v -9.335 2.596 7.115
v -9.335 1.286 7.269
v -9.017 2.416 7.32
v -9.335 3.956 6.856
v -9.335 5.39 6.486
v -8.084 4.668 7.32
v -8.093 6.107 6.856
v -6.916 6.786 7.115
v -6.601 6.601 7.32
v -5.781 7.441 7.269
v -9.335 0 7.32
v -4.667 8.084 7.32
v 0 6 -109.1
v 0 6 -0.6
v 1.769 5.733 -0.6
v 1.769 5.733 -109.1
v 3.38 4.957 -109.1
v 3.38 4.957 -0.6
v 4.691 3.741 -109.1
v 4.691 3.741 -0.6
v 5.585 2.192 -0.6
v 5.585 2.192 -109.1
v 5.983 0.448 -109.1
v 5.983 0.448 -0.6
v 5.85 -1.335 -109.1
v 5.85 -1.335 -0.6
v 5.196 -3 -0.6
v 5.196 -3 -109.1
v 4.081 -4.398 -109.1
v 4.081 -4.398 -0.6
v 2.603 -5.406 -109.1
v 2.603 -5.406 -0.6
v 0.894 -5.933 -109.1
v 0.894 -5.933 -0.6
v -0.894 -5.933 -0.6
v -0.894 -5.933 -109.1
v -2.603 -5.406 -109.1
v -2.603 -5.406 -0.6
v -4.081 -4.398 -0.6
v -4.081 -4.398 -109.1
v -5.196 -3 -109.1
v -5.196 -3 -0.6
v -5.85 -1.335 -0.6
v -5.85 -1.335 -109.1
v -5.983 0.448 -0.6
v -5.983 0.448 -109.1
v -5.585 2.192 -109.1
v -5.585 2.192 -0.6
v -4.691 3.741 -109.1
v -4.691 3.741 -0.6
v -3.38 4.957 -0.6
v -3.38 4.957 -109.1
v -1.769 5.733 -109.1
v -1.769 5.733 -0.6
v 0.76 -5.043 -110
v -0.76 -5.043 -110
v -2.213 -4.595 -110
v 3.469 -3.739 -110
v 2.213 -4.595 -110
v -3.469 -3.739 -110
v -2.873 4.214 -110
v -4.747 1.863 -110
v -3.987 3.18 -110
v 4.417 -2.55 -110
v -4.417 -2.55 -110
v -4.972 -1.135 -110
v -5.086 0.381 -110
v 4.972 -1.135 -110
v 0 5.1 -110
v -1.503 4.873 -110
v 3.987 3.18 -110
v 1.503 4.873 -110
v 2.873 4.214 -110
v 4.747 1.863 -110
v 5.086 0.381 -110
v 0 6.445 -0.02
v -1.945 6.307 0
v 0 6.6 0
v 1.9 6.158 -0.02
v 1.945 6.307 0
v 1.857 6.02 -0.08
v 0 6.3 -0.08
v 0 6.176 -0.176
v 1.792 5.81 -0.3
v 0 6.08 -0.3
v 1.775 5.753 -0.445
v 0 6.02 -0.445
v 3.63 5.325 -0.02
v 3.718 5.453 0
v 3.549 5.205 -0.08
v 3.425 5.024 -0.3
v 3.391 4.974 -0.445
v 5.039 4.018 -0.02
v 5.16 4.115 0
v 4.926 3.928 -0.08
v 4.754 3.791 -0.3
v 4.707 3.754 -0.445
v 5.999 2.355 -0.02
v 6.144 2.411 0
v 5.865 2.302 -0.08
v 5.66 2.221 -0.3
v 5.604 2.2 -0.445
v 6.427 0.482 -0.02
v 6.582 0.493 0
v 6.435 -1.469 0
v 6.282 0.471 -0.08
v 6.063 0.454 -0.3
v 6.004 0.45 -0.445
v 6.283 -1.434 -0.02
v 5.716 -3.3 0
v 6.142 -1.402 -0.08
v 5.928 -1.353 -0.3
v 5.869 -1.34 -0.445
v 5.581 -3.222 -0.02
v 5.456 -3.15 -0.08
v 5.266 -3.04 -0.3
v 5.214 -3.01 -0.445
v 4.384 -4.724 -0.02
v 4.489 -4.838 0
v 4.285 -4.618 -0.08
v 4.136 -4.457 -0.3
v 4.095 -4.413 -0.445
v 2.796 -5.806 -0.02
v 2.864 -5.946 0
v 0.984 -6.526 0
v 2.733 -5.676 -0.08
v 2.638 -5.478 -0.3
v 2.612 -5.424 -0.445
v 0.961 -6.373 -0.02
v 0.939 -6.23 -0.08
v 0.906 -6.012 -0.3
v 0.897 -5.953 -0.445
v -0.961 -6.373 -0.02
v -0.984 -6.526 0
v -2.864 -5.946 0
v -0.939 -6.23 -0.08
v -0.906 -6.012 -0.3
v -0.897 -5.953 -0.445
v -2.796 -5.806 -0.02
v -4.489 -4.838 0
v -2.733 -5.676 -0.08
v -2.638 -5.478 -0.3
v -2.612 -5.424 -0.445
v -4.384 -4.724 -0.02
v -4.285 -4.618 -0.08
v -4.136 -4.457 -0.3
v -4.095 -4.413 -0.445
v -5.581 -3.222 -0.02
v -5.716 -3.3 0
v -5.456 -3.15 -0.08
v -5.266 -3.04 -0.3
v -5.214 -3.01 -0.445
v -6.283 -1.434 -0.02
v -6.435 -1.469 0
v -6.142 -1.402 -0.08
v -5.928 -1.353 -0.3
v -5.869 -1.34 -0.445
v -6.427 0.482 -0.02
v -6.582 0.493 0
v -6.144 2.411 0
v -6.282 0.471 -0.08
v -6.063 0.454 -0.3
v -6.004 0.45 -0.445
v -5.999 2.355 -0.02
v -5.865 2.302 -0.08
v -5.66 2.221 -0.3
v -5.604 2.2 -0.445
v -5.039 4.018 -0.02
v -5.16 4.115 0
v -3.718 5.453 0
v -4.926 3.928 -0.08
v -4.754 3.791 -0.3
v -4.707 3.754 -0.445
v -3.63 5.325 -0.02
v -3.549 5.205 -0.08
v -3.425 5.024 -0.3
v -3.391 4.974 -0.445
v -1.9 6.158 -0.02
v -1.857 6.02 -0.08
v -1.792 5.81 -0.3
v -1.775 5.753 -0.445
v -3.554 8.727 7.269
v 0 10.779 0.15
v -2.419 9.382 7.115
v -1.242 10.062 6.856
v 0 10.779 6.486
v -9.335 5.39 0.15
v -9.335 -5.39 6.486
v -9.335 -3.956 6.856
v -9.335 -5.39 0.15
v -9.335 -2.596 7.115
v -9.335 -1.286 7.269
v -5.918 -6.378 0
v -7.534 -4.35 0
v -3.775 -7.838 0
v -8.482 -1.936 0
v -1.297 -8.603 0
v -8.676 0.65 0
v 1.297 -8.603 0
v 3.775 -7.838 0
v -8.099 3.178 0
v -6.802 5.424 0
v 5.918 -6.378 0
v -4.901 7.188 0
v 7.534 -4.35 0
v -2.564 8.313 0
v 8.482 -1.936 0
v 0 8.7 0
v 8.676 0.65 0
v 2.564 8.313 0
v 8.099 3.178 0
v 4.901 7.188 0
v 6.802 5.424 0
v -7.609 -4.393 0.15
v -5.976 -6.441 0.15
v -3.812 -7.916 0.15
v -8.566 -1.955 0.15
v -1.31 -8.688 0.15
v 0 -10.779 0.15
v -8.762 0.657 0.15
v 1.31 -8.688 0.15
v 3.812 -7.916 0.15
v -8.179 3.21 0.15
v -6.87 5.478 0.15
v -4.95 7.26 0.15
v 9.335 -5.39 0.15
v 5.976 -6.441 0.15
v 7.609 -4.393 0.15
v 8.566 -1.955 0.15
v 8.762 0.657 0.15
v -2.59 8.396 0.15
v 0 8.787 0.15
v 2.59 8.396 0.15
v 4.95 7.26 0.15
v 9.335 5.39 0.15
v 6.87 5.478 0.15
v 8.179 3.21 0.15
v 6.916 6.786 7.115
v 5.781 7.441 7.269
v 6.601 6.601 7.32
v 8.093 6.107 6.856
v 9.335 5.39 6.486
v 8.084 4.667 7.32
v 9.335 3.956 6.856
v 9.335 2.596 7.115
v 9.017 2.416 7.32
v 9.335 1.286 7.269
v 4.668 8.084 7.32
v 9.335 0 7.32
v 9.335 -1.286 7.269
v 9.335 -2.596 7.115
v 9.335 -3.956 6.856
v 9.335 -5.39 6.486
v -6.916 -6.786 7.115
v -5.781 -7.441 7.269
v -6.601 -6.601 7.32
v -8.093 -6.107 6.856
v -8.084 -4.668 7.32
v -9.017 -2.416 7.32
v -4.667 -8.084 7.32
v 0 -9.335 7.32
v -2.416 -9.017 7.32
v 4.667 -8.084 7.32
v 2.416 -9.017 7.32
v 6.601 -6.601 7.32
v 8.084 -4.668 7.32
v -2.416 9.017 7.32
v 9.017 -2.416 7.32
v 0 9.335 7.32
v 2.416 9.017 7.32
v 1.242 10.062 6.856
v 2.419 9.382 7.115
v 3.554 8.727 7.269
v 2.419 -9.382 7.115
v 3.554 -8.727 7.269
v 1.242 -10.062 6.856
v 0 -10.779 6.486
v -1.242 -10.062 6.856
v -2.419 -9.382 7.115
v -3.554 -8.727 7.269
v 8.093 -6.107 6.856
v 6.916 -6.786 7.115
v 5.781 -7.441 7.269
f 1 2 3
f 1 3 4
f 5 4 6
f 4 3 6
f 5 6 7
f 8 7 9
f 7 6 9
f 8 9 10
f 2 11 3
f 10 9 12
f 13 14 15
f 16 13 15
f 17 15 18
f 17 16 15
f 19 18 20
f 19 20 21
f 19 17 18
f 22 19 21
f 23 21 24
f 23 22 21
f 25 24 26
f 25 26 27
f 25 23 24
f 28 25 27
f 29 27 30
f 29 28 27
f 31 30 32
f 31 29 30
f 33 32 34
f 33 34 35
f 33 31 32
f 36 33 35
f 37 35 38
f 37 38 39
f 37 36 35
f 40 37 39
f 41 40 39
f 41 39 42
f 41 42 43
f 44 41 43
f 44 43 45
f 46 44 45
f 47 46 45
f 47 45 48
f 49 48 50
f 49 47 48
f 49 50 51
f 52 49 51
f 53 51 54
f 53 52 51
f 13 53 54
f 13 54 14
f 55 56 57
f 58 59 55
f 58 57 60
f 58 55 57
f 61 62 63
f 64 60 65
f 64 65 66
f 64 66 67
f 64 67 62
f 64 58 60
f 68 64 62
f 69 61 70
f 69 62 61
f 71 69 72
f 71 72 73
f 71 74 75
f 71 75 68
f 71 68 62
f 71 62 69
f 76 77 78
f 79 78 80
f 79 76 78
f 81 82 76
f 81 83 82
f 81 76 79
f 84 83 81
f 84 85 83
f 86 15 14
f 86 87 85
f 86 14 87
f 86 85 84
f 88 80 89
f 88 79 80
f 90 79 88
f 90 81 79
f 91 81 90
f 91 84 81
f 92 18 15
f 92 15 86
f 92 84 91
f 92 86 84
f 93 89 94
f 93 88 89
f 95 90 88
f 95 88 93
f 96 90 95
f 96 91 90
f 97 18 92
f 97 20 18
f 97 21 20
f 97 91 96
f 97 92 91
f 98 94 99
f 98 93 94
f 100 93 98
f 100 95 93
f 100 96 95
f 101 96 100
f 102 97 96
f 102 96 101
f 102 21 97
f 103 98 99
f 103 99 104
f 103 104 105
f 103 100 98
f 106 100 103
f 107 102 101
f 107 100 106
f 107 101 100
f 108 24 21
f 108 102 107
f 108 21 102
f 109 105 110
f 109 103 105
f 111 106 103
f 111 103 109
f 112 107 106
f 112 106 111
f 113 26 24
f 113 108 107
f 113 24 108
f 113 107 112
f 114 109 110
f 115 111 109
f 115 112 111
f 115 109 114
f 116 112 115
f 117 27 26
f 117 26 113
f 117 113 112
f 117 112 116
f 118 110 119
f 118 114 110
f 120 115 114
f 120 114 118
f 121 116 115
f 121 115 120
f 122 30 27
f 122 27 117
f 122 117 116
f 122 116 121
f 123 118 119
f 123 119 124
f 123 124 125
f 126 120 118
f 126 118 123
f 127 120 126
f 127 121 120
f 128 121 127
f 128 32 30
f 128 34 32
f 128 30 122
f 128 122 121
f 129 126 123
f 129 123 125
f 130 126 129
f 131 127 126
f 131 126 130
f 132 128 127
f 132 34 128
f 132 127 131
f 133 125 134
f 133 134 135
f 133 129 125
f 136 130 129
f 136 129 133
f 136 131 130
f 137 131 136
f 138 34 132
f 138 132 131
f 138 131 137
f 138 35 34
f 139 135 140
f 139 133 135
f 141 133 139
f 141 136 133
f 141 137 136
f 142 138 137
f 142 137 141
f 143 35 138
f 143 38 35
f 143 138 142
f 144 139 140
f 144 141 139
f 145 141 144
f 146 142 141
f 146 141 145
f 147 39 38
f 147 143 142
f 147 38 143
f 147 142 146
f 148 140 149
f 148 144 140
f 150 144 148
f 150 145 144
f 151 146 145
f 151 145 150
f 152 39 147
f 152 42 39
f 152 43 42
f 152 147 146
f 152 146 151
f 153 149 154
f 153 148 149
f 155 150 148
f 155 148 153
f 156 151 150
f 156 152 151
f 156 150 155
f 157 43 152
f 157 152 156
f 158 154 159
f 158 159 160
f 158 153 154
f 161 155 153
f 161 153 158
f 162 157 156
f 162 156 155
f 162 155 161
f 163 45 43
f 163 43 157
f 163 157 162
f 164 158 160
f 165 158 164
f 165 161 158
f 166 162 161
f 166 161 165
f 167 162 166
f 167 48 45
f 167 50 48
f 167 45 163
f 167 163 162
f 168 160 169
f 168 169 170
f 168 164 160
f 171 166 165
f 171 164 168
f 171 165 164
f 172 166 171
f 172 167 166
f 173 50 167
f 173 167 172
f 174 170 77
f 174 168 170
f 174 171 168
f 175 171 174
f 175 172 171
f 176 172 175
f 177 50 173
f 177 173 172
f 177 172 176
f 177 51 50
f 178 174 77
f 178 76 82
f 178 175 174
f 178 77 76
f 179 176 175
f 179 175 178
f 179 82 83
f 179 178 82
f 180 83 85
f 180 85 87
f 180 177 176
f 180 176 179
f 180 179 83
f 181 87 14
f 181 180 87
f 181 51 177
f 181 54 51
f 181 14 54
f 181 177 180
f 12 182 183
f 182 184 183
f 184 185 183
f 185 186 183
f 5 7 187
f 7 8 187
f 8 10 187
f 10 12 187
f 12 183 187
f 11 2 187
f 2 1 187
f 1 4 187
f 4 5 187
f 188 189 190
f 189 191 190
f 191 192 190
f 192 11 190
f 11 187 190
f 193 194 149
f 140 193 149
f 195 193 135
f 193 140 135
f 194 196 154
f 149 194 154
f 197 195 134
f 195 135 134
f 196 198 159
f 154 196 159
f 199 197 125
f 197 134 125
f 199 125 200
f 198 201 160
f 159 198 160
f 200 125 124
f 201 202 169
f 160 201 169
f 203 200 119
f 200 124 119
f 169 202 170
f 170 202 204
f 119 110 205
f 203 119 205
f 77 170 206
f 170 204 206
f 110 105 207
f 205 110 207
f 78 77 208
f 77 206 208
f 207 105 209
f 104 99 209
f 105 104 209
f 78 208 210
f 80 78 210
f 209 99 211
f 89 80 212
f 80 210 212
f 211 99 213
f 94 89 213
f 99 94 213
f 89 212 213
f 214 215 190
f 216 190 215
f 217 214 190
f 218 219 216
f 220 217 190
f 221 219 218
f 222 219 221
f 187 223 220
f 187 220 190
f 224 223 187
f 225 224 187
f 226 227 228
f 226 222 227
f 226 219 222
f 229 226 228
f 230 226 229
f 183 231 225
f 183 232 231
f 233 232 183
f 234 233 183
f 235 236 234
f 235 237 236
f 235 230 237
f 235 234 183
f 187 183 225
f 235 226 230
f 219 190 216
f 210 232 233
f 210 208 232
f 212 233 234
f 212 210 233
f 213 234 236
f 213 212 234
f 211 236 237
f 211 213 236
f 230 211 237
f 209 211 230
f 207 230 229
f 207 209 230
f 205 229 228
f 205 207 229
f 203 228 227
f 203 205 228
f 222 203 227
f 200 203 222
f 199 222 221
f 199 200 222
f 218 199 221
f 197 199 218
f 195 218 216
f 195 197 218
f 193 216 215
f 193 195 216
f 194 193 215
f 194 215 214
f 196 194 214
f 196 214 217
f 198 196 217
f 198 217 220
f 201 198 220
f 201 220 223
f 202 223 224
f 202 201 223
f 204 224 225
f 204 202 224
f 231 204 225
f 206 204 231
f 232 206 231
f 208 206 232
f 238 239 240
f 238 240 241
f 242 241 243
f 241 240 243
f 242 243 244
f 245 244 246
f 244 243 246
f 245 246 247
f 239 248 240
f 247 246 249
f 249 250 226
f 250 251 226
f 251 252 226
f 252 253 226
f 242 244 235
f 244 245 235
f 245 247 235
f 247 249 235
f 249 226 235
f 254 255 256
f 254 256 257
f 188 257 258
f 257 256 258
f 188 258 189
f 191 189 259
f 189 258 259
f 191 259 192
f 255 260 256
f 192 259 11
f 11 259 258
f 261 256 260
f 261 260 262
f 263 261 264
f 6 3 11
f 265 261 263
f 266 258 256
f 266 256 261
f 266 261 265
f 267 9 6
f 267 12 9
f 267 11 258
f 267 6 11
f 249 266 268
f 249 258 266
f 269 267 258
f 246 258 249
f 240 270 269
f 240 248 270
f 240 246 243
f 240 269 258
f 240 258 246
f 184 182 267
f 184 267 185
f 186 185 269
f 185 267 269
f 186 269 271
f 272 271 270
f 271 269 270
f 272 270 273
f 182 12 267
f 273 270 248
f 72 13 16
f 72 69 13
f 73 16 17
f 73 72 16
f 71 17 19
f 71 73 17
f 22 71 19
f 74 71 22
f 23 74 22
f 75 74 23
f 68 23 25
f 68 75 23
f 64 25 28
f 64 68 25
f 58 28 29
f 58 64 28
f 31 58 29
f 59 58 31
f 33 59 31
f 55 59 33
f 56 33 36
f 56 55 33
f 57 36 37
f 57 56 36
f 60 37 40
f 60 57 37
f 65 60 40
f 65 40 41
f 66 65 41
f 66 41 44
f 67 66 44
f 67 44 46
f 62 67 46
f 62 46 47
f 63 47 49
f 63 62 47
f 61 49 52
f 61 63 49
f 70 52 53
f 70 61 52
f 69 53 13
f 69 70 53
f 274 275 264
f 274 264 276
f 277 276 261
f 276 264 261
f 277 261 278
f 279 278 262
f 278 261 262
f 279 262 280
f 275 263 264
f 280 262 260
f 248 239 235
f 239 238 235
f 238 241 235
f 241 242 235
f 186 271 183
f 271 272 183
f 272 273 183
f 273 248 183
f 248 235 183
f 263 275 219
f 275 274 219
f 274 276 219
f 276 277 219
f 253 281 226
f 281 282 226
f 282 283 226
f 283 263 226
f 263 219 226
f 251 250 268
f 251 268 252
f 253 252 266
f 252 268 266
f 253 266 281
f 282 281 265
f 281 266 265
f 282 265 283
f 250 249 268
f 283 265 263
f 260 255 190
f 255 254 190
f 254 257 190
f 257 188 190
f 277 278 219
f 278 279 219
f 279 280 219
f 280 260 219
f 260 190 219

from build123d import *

# Parameters (mm, degrees)
BOSS_EXTRUDE1_DEPTH = 7.32


with BuildPart() as part:
    # Sketch1 → Boss-Extrude1 (new body)
    with BuildSketch(Plane.XY):
        Polygon((0, 10.779129526), (-9.335, 5.389564763), (-9.335, -5.389564763), (0, -10.779129526), (9.335, -5.389564763), (9.335, 5.389564763), align=None)
    extrude(amount=BOSS_EXTRUDE1_DEPTH)

    # Sketch2 → Revolve1 (revolve)
    with BuildSketch(Plane(origin=(0, 0, 0), x_dir=(0, 0, -1), z_dir=(1, 0, 0))):
        with BuildLine():
            Line((0, 0), (0, 6.6))
            ThreePointArc((0, 6.6), (0.175735931, 6.175735931), (0.6, 6))
            Line((0.6, 6), (109.1, 6))
            Line((109.1, 6), (110, 5.1))
            Line((110, 5.1), (110, 0))
            Line((110, 0), (0, 0))
        make_face()
    revolve(axis=Axis((0, 0, 0), (0, 0, -1)))

    # Sketch3 → Cut-Revolve1 (revolve, cut)
    with BuildSketch(Plane(origin=(0, 0, 0), x_dir=(0, 0, -1), z_dir=(1, 0, 0))):
        Polygon((-7.32, 10.779129526), (-6.48623143, 10.779129526), (-7.32, 9.335), align=None)
        Polygon((-0.15, 10.779129526), (-0.15, 8.78660254), (0, 8.7), (0, 10.779129526), align=None)
    revolve(axis=Axis((0, 0, 12.204941078), (0, 0, -1)), mode=Mode.SUBTRACT)


solid = part.part
